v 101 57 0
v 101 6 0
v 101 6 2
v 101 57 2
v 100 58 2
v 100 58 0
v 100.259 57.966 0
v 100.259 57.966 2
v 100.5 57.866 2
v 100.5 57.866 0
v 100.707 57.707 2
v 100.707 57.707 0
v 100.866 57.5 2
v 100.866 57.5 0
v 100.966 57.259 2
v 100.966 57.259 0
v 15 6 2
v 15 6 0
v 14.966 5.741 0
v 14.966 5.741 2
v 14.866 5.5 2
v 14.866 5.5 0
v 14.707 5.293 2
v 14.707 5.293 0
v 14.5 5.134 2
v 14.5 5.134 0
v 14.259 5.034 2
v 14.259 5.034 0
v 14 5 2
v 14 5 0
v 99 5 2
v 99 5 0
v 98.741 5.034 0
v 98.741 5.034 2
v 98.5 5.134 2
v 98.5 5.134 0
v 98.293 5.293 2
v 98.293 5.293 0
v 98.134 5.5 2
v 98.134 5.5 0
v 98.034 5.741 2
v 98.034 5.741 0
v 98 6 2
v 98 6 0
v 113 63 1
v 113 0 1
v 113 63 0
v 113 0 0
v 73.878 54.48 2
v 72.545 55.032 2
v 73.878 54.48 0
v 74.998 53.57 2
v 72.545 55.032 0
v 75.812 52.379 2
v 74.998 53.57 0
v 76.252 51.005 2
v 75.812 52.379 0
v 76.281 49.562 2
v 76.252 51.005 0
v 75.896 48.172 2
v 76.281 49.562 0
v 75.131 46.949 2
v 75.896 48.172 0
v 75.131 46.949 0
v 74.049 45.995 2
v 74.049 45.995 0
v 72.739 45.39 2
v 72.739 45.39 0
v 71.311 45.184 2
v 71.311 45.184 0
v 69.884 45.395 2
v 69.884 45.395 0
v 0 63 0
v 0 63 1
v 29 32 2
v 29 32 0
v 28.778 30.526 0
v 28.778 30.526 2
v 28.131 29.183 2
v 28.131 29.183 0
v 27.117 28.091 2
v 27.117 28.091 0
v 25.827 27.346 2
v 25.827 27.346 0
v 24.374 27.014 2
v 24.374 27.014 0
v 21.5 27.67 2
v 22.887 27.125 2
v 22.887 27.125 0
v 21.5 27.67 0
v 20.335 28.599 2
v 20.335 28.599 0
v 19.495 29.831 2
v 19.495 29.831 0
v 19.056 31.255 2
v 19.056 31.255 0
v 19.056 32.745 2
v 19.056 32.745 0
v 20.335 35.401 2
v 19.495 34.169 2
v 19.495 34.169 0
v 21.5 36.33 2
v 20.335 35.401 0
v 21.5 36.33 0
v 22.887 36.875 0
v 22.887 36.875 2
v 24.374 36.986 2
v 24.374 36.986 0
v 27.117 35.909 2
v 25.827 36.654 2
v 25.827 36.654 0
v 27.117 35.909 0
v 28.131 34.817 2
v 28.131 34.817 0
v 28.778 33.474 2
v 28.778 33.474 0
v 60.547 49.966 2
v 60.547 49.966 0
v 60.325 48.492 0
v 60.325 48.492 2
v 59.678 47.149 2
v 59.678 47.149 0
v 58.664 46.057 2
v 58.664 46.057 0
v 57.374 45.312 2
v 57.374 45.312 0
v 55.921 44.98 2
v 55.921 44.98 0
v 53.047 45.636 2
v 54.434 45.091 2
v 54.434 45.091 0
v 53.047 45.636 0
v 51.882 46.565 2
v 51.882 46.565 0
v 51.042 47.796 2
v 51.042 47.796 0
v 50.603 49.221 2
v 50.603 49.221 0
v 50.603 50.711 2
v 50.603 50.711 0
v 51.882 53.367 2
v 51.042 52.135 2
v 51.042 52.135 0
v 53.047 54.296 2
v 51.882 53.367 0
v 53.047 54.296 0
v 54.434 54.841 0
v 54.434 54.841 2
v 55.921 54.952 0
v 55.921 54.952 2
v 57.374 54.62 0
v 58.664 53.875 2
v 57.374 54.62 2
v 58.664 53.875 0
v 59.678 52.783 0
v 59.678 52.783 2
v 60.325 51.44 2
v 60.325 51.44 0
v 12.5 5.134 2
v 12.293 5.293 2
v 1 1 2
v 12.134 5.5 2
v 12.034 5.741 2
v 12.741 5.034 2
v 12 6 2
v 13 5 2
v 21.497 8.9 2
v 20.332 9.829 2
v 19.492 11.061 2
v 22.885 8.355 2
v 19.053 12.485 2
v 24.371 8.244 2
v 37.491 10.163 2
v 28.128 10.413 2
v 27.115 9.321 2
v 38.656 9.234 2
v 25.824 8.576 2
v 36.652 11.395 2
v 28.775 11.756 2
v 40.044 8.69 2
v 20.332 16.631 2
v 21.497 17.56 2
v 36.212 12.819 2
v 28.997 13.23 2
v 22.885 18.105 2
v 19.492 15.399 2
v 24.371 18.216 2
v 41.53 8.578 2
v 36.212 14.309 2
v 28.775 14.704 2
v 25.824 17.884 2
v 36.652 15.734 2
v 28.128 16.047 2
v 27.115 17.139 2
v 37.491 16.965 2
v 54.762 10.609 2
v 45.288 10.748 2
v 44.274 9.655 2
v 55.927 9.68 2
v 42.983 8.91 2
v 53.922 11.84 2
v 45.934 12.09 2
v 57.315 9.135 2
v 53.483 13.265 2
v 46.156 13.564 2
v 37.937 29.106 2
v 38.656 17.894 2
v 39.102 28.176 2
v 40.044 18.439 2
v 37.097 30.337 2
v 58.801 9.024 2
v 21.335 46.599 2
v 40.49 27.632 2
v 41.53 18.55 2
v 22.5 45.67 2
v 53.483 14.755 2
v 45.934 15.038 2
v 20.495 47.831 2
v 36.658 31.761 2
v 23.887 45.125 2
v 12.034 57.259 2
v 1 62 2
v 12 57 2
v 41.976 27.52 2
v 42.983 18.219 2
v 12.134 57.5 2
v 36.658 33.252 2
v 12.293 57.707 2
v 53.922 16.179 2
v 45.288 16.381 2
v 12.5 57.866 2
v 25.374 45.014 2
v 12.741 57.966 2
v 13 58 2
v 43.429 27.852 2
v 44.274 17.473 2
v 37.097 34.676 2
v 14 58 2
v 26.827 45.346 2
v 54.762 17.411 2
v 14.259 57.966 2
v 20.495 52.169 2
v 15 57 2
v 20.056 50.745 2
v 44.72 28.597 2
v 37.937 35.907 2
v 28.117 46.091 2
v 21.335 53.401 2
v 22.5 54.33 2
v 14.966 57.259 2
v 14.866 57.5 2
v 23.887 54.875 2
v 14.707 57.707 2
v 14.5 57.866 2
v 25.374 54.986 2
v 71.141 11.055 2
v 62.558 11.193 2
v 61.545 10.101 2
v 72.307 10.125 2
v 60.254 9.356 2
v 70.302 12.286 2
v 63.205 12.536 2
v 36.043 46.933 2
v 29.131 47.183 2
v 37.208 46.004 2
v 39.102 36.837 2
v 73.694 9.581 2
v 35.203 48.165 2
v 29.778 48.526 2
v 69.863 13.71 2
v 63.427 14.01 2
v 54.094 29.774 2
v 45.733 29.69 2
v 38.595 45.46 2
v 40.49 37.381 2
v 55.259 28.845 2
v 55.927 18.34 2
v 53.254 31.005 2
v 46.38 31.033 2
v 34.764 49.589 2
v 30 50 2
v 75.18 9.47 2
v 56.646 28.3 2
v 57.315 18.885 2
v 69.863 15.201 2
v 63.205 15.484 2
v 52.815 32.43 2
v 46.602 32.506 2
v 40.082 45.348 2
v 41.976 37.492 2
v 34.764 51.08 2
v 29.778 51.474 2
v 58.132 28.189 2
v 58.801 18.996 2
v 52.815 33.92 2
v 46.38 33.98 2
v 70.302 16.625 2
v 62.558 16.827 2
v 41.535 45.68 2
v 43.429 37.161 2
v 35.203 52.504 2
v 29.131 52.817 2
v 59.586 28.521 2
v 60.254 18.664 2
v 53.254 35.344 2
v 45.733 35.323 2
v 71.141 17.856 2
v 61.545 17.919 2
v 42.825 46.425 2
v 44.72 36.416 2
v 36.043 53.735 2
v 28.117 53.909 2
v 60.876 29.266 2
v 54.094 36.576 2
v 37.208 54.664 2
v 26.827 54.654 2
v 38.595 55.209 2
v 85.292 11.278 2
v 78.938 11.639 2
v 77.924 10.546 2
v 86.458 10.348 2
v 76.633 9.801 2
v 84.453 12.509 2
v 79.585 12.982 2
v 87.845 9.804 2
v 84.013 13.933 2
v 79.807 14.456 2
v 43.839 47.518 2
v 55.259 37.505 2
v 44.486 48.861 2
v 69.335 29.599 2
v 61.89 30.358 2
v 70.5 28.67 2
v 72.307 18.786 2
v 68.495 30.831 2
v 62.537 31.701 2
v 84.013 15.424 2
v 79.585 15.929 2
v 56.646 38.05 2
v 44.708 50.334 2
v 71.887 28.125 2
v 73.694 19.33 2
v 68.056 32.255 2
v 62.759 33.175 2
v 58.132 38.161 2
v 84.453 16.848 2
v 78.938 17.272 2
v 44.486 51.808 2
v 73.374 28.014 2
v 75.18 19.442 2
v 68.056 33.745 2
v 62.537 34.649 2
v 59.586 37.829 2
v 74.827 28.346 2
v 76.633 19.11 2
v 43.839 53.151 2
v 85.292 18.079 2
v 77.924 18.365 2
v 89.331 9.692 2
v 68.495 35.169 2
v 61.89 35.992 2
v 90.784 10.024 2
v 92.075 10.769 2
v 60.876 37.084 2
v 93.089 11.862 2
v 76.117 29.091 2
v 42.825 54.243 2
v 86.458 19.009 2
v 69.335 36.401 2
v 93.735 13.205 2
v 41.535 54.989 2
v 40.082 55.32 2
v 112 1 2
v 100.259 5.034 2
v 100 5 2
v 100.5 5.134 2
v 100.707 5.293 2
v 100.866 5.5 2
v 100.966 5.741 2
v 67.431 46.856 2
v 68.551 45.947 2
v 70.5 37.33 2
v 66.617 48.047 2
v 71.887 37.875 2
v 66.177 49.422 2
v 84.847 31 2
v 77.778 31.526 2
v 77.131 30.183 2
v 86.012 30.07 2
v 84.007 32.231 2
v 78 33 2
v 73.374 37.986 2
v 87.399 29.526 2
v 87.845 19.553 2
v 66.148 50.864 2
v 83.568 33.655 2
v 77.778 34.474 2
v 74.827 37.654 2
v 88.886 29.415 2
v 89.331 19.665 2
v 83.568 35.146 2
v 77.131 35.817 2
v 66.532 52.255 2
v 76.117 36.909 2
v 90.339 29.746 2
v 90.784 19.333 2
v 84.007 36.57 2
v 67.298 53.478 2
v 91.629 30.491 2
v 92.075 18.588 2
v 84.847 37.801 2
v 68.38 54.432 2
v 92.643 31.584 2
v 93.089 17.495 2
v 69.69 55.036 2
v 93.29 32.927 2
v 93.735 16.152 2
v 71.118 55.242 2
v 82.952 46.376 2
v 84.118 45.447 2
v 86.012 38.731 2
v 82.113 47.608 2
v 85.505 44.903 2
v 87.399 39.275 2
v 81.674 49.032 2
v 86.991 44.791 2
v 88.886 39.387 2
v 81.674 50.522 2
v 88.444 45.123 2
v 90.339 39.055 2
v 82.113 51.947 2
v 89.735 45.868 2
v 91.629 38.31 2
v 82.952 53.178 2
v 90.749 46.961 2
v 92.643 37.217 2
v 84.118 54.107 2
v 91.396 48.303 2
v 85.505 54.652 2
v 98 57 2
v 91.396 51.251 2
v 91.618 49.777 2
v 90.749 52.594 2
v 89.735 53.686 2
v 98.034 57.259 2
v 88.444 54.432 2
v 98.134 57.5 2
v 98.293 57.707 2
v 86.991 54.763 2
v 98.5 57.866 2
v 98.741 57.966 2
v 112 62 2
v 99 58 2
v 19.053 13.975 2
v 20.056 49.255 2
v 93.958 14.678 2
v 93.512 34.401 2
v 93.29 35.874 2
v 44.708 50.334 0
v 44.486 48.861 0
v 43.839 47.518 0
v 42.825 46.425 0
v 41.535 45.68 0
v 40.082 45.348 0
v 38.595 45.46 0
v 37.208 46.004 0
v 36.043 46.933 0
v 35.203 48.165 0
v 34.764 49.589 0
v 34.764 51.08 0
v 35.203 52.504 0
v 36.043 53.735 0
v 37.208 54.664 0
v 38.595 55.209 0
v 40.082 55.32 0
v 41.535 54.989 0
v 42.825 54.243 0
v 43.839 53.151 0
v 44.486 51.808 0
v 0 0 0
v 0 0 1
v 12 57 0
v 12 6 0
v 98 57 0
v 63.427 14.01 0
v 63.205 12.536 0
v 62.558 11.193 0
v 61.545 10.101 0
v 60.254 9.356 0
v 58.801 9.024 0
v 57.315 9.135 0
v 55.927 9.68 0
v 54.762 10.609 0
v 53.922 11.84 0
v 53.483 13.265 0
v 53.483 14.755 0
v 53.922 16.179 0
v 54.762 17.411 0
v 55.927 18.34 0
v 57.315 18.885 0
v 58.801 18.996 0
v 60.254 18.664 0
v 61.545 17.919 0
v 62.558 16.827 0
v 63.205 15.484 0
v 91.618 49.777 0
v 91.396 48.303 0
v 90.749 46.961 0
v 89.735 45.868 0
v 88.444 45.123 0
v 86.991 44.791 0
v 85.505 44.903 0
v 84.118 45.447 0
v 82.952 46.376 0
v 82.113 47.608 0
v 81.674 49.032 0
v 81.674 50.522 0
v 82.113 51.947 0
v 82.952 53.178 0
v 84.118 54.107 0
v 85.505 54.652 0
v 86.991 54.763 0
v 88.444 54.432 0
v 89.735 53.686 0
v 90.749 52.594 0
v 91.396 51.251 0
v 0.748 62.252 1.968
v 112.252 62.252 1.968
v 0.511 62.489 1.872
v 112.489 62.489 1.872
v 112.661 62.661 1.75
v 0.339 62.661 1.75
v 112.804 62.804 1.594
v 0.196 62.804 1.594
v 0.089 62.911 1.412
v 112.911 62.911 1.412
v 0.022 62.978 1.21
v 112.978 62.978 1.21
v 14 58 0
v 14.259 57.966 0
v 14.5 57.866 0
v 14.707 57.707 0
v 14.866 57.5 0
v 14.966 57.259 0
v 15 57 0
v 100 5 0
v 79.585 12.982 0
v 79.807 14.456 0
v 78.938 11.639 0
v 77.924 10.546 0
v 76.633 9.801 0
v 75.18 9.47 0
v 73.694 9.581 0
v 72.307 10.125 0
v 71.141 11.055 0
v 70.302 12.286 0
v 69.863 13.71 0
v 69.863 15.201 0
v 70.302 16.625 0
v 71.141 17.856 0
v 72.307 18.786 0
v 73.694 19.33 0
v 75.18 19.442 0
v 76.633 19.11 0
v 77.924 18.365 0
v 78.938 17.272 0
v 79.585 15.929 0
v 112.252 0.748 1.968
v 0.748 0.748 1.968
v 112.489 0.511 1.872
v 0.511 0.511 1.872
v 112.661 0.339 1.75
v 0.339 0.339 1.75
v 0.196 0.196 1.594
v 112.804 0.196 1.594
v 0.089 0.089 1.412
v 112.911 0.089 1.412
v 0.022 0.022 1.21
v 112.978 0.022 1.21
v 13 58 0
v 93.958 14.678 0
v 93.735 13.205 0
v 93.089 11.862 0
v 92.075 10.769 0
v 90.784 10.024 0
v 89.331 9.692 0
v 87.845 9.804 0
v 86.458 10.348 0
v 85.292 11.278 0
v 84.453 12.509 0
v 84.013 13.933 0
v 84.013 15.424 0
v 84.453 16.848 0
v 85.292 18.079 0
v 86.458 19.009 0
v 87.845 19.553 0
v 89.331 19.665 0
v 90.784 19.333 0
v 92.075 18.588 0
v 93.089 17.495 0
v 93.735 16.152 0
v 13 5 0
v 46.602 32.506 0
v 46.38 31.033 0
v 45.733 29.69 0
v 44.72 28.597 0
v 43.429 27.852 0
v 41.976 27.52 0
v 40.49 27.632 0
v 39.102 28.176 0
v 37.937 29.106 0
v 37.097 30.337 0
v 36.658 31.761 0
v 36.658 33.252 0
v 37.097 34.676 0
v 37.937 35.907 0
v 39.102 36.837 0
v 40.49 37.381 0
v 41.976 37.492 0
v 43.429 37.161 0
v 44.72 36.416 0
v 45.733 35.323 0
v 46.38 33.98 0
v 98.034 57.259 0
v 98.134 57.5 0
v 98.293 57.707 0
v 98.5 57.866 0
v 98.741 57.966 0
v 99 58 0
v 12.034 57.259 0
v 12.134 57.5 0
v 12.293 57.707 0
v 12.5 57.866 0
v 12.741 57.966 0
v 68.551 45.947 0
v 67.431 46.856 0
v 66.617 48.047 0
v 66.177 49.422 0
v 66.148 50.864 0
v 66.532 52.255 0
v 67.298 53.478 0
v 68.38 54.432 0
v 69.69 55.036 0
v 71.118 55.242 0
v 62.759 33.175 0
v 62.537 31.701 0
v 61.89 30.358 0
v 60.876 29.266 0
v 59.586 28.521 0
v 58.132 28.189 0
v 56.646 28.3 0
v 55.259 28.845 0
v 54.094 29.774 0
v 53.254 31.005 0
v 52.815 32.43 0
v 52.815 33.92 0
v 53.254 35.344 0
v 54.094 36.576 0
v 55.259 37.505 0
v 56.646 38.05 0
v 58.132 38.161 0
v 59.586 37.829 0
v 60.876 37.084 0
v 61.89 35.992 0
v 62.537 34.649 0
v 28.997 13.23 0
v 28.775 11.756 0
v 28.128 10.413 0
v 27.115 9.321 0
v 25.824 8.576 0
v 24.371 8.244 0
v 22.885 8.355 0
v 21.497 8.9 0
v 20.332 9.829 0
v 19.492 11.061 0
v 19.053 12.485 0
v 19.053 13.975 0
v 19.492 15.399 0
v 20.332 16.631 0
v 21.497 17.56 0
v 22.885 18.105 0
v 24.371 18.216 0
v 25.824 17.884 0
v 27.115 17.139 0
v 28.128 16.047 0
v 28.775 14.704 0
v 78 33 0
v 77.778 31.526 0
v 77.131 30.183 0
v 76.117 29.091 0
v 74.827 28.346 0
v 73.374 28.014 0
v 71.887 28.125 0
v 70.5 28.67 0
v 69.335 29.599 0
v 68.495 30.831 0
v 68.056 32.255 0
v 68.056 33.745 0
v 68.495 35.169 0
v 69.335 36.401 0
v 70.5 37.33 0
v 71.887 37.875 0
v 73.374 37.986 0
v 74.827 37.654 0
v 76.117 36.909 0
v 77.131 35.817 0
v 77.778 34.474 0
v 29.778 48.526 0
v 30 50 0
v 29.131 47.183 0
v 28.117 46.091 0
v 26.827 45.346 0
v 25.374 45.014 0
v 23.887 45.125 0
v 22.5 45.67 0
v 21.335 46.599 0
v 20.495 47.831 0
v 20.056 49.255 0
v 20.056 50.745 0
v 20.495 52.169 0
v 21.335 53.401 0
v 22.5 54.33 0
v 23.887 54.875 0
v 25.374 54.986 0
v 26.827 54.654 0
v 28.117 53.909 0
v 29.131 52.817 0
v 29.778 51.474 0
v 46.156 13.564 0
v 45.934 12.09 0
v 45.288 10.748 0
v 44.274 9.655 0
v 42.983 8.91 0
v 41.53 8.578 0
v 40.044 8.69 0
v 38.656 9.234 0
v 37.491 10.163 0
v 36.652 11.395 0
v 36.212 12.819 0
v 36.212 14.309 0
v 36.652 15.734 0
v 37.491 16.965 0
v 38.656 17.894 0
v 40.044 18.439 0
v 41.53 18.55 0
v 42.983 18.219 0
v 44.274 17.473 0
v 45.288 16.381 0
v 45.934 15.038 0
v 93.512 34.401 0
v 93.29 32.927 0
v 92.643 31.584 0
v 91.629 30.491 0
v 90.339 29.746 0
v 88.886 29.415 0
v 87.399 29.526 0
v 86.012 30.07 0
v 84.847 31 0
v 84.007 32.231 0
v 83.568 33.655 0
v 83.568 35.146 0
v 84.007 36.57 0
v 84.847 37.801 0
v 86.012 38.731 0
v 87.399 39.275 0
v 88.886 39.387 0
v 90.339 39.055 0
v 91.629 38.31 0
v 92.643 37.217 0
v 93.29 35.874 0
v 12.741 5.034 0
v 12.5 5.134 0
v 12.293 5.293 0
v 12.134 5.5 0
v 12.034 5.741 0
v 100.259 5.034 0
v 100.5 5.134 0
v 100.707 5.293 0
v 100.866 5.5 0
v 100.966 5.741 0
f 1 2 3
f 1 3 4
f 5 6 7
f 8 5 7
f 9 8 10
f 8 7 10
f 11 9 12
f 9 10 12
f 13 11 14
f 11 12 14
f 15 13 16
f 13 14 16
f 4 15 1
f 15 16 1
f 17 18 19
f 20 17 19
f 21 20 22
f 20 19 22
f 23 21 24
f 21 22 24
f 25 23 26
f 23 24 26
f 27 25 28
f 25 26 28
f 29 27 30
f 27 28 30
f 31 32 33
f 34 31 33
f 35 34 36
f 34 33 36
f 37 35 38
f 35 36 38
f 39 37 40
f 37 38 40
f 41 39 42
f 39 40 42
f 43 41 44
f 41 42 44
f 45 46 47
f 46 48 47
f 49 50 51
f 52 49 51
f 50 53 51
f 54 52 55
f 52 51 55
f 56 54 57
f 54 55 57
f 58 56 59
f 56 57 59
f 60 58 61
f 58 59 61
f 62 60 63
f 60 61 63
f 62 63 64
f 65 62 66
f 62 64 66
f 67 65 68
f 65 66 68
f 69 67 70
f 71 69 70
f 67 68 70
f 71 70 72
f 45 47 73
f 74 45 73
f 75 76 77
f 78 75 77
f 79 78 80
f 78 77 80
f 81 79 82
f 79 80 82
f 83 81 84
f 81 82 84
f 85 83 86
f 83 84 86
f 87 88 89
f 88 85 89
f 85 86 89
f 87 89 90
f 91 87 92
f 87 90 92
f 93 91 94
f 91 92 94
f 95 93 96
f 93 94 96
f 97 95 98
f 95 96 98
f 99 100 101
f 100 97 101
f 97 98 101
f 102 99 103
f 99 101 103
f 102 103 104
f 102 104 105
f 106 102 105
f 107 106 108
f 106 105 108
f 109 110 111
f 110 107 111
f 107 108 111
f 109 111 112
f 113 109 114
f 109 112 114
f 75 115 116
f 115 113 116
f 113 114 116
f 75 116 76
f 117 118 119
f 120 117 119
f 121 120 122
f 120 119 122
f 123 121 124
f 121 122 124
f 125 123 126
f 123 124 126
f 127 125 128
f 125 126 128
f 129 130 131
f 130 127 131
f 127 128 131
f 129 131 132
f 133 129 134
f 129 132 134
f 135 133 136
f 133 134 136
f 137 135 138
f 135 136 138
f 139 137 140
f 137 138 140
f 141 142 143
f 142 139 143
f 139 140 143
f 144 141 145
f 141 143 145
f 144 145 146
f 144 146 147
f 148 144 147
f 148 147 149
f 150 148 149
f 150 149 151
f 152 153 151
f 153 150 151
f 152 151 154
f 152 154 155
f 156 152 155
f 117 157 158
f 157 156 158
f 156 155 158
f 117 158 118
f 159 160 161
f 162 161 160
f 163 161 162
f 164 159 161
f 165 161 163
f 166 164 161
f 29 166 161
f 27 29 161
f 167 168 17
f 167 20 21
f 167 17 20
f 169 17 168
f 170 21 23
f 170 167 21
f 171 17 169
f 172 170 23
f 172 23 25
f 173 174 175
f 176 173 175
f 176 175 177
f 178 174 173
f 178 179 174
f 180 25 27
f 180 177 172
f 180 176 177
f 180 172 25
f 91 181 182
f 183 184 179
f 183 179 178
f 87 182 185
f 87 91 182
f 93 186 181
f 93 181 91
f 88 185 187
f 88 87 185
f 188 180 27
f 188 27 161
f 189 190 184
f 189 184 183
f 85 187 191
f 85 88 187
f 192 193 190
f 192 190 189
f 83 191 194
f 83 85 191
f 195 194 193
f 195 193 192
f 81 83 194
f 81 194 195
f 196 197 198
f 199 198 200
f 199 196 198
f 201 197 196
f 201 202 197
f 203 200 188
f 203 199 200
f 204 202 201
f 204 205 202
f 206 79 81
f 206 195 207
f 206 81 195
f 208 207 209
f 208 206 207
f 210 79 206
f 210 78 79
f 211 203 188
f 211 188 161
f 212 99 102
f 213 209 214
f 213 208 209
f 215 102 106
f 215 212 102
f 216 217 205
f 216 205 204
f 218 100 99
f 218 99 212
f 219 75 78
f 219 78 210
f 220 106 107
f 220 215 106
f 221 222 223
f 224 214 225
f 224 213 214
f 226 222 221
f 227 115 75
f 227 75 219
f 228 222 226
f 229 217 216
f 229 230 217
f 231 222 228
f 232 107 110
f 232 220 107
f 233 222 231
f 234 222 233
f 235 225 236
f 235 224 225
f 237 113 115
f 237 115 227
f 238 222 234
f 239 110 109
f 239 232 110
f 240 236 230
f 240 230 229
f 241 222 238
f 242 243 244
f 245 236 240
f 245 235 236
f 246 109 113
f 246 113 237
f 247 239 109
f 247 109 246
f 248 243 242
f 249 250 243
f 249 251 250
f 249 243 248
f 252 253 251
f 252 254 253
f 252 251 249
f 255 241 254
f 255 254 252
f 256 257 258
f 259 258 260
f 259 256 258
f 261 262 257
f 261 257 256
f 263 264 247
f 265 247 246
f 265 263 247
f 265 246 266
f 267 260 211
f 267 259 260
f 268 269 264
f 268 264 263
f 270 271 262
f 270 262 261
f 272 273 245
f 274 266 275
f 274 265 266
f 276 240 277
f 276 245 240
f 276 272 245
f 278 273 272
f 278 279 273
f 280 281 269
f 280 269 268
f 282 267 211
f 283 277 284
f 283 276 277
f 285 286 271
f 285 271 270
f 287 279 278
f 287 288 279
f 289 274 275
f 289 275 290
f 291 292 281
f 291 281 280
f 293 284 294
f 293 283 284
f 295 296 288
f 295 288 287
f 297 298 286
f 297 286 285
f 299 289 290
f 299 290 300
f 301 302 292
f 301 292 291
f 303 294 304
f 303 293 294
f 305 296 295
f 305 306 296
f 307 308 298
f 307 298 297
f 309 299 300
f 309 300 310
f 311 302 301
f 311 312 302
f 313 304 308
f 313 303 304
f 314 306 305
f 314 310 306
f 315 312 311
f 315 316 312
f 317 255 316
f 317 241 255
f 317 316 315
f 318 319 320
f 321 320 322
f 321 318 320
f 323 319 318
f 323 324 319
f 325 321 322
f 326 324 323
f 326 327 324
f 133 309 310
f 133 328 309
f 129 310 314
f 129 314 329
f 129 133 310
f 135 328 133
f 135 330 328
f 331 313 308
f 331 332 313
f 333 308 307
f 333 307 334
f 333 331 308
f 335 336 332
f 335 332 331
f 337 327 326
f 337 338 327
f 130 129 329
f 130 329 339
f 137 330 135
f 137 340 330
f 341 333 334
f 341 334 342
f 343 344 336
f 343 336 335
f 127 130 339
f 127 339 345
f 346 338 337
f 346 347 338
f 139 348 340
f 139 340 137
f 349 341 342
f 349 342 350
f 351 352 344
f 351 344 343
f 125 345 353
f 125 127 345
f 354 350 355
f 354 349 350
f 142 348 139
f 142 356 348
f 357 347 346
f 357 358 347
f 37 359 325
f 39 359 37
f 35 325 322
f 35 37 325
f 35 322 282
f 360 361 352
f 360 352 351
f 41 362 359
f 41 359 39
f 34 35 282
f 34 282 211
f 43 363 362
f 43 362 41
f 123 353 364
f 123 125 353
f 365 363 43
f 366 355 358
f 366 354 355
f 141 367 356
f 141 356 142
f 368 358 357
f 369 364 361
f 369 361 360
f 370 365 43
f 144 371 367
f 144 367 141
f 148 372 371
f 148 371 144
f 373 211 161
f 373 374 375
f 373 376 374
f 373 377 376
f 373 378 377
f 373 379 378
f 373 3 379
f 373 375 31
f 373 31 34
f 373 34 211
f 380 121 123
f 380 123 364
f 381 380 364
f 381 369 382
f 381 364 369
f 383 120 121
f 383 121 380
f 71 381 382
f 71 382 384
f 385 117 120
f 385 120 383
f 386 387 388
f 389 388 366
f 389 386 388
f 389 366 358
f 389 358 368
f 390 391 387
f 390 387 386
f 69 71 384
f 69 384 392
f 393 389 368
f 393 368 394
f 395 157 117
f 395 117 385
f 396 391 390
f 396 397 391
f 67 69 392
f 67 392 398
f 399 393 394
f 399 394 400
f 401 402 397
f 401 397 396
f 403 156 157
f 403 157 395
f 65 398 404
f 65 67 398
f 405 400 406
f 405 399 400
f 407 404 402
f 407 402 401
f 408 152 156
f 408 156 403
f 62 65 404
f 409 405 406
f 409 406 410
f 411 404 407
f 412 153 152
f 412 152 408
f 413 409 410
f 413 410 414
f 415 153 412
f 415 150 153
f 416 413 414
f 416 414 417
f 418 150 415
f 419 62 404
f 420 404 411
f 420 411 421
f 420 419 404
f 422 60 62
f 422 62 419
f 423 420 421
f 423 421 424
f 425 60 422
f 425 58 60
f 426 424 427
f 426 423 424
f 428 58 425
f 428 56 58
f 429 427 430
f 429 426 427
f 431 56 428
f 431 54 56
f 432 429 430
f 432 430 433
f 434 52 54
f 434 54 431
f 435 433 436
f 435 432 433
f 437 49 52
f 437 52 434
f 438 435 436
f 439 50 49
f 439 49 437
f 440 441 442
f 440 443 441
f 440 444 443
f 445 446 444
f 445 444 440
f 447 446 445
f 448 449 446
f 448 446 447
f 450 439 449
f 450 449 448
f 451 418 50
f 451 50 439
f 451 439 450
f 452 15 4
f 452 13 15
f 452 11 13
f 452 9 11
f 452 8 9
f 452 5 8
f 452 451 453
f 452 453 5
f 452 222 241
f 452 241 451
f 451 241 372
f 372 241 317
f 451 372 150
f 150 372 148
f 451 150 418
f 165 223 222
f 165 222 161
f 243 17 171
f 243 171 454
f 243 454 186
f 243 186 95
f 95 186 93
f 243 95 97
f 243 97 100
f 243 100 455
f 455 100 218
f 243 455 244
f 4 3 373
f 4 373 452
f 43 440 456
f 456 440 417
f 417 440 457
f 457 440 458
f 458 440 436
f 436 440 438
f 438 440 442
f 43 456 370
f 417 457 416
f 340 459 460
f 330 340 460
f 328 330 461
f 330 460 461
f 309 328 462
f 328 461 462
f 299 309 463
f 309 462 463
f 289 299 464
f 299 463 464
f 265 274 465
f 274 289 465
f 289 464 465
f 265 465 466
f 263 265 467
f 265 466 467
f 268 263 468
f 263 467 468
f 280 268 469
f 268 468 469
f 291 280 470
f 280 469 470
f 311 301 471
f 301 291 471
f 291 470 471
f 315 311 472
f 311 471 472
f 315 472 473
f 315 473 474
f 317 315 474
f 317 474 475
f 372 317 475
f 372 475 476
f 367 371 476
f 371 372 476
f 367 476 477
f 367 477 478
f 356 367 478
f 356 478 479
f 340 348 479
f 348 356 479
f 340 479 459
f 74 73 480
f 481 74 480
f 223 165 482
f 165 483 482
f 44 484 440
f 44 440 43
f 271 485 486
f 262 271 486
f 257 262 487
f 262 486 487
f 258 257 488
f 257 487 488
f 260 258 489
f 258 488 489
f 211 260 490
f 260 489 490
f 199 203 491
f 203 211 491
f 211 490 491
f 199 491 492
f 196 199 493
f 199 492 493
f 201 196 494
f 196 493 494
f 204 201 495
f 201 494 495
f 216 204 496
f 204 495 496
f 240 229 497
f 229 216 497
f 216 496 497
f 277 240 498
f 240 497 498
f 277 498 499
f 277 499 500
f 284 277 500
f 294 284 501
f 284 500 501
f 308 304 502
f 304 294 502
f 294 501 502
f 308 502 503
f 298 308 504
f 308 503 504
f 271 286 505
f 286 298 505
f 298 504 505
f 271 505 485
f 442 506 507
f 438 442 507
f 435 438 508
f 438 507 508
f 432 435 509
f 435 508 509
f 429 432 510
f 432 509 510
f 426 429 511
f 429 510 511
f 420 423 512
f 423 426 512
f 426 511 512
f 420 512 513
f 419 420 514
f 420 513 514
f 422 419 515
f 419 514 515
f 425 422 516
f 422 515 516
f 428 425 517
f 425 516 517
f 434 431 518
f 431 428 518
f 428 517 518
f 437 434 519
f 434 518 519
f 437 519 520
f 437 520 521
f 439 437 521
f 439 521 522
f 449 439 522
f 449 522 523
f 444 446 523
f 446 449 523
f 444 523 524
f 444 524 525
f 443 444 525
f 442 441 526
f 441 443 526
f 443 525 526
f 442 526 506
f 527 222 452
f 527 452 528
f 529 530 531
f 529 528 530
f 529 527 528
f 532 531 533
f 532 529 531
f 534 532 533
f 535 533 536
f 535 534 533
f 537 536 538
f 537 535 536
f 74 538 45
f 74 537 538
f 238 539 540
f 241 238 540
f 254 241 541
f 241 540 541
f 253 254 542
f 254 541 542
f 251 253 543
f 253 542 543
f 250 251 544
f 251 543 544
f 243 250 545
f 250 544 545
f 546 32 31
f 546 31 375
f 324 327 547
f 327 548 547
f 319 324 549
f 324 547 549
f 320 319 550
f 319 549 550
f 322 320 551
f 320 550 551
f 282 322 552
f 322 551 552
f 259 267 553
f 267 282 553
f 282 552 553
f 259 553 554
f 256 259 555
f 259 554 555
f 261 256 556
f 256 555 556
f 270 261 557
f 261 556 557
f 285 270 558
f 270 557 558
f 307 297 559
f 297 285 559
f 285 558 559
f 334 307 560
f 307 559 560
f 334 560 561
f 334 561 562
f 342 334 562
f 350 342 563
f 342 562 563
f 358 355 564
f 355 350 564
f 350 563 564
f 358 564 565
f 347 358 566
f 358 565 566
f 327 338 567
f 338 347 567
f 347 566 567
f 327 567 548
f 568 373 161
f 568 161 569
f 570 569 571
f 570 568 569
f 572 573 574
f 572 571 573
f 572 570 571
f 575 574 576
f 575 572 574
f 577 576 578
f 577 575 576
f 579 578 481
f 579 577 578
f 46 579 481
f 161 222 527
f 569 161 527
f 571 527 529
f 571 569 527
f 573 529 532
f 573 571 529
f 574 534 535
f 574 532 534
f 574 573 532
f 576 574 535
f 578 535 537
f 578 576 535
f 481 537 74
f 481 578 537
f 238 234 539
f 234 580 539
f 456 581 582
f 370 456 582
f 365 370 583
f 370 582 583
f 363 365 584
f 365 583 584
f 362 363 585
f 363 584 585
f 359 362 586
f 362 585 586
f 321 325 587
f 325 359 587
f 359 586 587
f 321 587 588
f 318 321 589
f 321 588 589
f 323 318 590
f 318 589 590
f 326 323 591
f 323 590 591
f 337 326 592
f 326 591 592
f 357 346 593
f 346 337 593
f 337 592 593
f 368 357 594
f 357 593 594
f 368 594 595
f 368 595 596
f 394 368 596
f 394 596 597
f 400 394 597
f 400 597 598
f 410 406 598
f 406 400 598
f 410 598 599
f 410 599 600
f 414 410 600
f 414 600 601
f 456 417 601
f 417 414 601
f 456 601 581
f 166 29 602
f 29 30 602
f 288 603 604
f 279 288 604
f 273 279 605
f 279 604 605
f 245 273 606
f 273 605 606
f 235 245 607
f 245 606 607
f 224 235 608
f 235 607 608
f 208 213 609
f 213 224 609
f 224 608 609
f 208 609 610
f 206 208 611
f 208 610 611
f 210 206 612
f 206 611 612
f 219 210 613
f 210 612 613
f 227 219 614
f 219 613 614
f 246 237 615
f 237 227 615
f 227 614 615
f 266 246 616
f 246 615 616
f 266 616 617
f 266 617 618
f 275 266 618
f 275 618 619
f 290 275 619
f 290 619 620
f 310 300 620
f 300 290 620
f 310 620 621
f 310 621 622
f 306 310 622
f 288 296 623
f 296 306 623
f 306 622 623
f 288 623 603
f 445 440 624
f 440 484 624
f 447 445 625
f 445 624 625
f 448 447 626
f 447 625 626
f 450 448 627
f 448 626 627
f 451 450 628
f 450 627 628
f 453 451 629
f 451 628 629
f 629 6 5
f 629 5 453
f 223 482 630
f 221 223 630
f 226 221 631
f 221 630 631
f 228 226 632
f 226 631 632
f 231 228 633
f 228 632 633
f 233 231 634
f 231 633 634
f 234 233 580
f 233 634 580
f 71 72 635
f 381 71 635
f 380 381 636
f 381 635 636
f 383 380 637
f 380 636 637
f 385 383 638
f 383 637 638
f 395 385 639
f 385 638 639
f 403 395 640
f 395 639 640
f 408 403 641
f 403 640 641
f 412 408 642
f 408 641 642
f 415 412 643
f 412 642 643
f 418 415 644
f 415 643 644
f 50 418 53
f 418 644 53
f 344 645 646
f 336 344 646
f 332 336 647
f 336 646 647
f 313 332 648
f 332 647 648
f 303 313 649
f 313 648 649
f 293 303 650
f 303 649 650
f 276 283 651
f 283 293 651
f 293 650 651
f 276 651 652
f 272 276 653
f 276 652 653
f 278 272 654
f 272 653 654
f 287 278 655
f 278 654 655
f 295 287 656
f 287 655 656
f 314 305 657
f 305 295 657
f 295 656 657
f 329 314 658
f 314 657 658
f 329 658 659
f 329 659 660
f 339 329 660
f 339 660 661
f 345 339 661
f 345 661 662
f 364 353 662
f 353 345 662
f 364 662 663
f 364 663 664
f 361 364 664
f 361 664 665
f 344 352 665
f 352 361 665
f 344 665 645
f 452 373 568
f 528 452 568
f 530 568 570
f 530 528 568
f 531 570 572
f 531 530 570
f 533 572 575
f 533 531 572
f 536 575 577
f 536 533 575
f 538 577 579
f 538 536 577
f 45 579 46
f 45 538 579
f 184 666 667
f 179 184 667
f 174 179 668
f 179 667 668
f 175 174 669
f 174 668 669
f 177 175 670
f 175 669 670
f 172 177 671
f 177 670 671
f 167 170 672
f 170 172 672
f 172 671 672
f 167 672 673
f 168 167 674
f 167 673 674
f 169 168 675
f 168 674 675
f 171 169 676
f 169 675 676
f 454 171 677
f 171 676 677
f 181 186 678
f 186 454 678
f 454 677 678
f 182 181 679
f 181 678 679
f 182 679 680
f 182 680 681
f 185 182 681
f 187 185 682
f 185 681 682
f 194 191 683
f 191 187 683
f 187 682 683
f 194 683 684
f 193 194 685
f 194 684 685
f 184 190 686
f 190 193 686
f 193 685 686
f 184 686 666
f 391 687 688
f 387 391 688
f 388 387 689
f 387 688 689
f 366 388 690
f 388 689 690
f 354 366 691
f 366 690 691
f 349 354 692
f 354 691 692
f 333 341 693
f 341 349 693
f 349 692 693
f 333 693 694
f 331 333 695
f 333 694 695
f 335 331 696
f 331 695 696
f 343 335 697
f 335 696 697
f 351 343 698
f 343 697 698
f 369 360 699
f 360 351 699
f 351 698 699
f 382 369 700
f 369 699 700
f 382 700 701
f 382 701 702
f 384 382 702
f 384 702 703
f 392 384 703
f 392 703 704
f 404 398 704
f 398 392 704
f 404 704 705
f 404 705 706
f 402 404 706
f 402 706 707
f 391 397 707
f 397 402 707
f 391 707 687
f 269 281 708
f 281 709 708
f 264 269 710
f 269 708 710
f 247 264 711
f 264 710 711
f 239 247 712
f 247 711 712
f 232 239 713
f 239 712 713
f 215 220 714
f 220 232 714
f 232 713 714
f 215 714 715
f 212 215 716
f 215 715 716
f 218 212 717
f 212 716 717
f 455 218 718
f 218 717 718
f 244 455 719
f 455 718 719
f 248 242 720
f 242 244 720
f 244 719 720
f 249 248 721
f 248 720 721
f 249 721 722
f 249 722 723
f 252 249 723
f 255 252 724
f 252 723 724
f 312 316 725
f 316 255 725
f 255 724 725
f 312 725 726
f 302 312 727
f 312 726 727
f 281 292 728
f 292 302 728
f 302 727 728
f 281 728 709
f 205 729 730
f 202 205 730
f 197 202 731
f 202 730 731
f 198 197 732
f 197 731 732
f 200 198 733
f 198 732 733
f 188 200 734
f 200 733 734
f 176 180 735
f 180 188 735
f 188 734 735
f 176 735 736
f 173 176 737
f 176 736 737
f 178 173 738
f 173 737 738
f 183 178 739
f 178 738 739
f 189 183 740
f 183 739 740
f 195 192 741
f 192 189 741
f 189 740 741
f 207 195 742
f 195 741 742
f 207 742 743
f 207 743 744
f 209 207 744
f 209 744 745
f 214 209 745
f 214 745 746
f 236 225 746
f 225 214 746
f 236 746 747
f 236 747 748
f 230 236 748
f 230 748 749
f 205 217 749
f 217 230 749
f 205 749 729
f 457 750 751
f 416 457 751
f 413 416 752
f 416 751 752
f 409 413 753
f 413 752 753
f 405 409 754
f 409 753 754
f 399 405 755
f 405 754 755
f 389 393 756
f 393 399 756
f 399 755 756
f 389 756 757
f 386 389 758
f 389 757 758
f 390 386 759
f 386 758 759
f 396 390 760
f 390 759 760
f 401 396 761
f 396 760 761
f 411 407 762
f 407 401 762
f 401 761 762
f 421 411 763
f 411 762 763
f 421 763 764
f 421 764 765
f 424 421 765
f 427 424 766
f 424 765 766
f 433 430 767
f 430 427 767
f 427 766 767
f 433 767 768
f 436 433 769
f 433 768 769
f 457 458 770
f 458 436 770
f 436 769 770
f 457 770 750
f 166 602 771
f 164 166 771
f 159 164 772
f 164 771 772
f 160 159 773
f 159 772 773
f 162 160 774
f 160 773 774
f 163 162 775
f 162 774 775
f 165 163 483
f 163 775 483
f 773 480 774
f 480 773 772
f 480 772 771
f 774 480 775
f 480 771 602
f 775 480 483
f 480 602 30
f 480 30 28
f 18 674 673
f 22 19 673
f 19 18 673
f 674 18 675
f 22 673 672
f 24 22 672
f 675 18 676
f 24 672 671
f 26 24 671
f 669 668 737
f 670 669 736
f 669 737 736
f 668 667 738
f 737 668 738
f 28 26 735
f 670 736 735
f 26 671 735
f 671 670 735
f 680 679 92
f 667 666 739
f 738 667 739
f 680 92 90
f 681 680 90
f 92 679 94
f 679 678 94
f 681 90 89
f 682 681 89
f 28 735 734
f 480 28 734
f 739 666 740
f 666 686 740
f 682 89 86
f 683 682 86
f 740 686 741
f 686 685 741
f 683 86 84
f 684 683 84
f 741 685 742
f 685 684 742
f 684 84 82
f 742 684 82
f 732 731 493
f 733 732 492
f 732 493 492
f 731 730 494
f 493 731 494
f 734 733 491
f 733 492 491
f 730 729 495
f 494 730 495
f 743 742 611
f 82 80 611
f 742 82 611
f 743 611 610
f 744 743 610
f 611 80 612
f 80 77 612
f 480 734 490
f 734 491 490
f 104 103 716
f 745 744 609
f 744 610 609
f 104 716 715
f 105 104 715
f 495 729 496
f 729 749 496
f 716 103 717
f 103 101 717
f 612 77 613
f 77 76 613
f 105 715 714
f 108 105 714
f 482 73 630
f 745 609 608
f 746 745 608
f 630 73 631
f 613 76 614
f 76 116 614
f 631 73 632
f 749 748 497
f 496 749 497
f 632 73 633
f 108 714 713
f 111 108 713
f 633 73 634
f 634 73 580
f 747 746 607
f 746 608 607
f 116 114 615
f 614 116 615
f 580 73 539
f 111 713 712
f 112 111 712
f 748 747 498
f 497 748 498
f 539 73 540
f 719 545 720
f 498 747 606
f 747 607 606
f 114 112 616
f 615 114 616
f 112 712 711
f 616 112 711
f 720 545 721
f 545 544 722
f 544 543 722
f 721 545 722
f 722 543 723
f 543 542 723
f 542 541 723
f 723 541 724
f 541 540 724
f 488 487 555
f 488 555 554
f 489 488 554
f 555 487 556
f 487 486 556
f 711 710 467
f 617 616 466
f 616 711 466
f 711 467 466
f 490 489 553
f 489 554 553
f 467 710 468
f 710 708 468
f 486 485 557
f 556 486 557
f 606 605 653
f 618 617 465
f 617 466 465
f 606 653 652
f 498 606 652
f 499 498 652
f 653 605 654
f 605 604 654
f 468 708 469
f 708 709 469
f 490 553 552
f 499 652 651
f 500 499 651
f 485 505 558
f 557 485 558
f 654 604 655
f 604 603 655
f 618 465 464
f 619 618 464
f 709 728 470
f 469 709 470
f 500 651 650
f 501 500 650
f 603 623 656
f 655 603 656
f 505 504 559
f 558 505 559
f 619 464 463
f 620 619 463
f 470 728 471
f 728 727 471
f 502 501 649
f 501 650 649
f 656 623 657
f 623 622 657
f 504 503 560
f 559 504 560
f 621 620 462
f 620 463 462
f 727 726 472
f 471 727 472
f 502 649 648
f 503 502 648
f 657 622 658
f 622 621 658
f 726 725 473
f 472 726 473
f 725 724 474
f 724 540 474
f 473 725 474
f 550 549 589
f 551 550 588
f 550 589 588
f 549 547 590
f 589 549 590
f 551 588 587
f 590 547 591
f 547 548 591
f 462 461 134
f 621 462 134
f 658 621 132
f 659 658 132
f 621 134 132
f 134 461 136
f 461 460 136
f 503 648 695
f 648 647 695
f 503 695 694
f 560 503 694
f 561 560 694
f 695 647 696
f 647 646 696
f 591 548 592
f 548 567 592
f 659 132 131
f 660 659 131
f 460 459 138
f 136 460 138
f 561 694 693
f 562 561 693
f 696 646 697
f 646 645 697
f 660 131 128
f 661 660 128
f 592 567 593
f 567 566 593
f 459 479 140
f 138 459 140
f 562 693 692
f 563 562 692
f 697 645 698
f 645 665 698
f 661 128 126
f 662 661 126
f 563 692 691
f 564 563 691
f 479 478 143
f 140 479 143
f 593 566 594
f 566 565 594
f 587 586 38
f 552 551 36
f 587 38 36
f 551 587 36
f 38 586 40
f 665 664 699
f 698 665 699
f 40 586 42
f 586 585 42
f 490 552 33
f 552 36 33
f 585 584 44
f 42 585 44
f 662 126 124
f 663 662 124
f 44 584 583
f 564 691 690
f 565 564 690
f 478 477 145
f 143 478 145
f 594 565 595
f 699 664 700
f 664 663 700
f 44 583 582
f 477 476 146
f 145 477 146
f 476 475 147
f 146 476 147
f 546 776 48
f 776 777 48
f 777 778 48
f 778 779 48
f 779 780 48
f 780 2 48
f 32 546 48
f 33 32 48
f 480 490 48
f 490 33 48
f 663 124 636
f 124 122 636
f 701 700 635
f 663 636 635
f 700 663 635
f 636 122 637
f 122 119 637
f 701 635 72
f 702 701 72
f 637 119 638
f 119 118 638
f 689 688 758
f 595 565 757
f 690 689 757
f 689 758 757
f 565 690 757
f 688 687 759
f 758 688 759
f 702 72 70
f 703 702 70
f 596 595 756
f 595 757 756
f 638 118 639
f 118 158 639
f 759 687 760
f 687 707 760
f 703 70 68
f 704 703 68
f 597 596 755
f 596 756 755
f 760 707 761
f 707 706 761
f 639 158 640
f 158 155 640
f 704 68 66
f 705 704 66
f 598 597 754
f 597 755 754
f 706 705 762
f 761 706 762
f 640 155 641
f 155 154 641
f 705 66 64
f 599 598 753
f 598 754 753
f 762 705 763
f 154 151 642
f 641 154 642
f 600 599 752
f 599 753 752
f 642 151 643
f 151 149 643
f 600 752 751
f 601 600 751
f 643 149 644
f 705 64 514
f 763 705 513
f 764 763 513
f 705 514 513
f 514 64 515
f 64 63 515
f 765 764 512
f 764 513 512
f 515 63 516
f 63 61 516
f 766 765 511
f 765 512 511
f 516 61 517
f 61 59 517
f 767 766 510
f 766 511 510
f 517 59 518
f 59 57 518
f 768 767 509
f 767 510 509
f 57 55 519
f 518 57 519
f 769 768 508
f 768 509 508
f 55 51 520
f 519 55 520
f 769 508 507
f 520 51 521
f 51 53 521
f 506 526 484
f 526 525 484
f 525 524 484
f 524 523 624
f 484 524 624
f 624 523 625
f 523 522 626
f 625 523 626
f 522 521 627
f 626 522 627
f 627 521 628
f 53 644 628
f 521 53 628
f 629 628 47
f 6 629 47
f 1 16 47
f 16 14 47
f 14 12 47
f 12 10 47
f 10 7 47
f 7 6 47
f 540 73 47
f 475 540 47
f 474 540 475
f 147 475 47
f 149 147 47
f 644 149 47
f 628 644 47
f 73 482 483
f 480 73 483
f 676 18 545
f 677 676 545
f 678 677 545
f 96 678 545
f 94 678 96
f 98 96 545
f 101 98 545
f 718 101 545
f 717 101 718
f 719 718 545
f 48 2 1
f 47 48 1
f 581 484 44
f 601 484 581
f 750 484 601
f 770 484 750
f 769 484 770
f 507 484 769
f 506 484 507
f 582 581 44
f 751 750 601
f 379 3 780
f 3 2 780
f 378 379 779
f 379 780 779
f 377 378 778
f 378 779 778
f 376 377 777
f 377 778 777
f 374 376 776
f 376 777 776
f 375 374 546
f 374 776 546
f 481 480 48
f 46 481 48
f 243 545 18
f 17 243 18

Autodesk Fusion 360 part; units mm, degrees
sketch "Sketch1" plane through (0, 0, 0) normal (0, 0, 1) x (1, 0, 0) in component "base_layer"
  line L0 (0, 0) -> (113, 0)
  line L1 (113, 0) -> (113, 63)
  line L2 (113, 63) -> (0, 63)
  line L3 (0, 63) -> (0, 0)
  line L4 (9, 58) -> (12, 58)
  line L5 (104, 58) -> (101, 58)
  line L6 (13, 58) -> (14, 58)
  line L7 (15, 57) -> (15, 6)
  line L8 (14, 5) -> (13, 5)
  line L9 (12, 6) -> (12, 57)
  line L10 (100, 58) -> (99, 58)
  line L11 (98, 57) -> (98, 6)
  line L12 (99, 5) -> (100, 5)
  line L13 (101, 6) -> (101, 57)
  arc A0 (13, 58) -> (12, 57) centre (13, 57) ccw
  arc A1 (15, 57) -> (14, 58) centre (14, 57) ccw
  arc A2 (12, 6) -> (13, 5) centre (13, 6) ccw
  arc A3 (14, 5) -> (15, 6) centre (14, 6) ccw
  arc A4 (99, 58) -> (98, 57) centre (99, 57) ccw
  arc A5 (101, 57) -> (100, 58) centre (100, 57) ccw
  arc A6 (100, 5) -> (101, 6) centre (100, 6) ccw
  arc A7 (98, 6) -> (99, 5) centre (99, 6) ccw
  circle A8 centre (25, 50) radius 5
  circle A9 centre (25, 50) radius 5
  circle A10 centre (55.5469, 49.9659) radius 5
  circle A11 centre (71.1094, 50.2422) radius 5
  circle A12 centre (71.3194, 50.1842) radius 5
  circle A13 centre (86.6177, 49.7772) radius 5
  circle A14 centre (25, 50) radius 5
  circle A15 centre (24, 32) radius 5
  circle A16 centre (23.9972, 13.23) radius 5
  circle A17 centre (41.6022, 32.5064) radius 5
  circle A18 centre (41.1565, 13.5642) radius 5
  circle A19 centre (39.708, 50.3343) radius 5
  circle A20 centre (57.7588, 33.1749) radius 5
  circle A21 centre (73, 33) radius 5
  circle A22 centre (88.5119, 34.4006) radius 5
  circle A23 centre (58.4273, 14.0099) radius 5
  circle A24 centre (74.8067, 14.4556) radius 5
  circle A25 centre (88.9576, 14.6785) radius 5
  point P0 (15, 58)
  point P1 (15, 5)
  point P2 (98, 58)
  dimension "d1" = 113
  dimension "d2" = 63
  dimension "d5" = 5
  dimension "d7" = 5
  dimension "d14" = 3
  dimension "d15" = 5
  dimension "d16" = 3
  dimension "d17" = 5
  dimension "d18" = 1
  dimension "d19" = 1
  dimension "d20" = 1
  dimension "d21" = 1
  dimension "d22" = 10
  dimension "d23" = 10
  dimension "d24" = 10
  dimension "d25" = 10
  dimension "d26" = 10
  dimension "d27" = 10
  dimension "d28" = 10
  dimension "d29" = 10
  dimension "d30" = 10
  dimension "d31" = 10
  dimension "d32" = 10
  dimension "d33" = 10
  dimension "d34" = 10
  dimension "d35" = 10
  dimension "d36" = 10
  dimension "d37" = 10
  dimension "d38" = 10
  dimension "d39" = 10
extrude "Extrude1" add sketch "Sketch1" along normal blind 2 in component "base_layer"
fillet "Fillet1" radius 1 4 edges at (113, 31.5, 2) (56.5, 63, 2) (0, 31.5, 2) (56.5, 0, 2) in component "base_layer"
component "base_layer" placed x (1, 0, 0) y (0, 1, 0) z (0, 0, 1) at (0, 0, 0)
